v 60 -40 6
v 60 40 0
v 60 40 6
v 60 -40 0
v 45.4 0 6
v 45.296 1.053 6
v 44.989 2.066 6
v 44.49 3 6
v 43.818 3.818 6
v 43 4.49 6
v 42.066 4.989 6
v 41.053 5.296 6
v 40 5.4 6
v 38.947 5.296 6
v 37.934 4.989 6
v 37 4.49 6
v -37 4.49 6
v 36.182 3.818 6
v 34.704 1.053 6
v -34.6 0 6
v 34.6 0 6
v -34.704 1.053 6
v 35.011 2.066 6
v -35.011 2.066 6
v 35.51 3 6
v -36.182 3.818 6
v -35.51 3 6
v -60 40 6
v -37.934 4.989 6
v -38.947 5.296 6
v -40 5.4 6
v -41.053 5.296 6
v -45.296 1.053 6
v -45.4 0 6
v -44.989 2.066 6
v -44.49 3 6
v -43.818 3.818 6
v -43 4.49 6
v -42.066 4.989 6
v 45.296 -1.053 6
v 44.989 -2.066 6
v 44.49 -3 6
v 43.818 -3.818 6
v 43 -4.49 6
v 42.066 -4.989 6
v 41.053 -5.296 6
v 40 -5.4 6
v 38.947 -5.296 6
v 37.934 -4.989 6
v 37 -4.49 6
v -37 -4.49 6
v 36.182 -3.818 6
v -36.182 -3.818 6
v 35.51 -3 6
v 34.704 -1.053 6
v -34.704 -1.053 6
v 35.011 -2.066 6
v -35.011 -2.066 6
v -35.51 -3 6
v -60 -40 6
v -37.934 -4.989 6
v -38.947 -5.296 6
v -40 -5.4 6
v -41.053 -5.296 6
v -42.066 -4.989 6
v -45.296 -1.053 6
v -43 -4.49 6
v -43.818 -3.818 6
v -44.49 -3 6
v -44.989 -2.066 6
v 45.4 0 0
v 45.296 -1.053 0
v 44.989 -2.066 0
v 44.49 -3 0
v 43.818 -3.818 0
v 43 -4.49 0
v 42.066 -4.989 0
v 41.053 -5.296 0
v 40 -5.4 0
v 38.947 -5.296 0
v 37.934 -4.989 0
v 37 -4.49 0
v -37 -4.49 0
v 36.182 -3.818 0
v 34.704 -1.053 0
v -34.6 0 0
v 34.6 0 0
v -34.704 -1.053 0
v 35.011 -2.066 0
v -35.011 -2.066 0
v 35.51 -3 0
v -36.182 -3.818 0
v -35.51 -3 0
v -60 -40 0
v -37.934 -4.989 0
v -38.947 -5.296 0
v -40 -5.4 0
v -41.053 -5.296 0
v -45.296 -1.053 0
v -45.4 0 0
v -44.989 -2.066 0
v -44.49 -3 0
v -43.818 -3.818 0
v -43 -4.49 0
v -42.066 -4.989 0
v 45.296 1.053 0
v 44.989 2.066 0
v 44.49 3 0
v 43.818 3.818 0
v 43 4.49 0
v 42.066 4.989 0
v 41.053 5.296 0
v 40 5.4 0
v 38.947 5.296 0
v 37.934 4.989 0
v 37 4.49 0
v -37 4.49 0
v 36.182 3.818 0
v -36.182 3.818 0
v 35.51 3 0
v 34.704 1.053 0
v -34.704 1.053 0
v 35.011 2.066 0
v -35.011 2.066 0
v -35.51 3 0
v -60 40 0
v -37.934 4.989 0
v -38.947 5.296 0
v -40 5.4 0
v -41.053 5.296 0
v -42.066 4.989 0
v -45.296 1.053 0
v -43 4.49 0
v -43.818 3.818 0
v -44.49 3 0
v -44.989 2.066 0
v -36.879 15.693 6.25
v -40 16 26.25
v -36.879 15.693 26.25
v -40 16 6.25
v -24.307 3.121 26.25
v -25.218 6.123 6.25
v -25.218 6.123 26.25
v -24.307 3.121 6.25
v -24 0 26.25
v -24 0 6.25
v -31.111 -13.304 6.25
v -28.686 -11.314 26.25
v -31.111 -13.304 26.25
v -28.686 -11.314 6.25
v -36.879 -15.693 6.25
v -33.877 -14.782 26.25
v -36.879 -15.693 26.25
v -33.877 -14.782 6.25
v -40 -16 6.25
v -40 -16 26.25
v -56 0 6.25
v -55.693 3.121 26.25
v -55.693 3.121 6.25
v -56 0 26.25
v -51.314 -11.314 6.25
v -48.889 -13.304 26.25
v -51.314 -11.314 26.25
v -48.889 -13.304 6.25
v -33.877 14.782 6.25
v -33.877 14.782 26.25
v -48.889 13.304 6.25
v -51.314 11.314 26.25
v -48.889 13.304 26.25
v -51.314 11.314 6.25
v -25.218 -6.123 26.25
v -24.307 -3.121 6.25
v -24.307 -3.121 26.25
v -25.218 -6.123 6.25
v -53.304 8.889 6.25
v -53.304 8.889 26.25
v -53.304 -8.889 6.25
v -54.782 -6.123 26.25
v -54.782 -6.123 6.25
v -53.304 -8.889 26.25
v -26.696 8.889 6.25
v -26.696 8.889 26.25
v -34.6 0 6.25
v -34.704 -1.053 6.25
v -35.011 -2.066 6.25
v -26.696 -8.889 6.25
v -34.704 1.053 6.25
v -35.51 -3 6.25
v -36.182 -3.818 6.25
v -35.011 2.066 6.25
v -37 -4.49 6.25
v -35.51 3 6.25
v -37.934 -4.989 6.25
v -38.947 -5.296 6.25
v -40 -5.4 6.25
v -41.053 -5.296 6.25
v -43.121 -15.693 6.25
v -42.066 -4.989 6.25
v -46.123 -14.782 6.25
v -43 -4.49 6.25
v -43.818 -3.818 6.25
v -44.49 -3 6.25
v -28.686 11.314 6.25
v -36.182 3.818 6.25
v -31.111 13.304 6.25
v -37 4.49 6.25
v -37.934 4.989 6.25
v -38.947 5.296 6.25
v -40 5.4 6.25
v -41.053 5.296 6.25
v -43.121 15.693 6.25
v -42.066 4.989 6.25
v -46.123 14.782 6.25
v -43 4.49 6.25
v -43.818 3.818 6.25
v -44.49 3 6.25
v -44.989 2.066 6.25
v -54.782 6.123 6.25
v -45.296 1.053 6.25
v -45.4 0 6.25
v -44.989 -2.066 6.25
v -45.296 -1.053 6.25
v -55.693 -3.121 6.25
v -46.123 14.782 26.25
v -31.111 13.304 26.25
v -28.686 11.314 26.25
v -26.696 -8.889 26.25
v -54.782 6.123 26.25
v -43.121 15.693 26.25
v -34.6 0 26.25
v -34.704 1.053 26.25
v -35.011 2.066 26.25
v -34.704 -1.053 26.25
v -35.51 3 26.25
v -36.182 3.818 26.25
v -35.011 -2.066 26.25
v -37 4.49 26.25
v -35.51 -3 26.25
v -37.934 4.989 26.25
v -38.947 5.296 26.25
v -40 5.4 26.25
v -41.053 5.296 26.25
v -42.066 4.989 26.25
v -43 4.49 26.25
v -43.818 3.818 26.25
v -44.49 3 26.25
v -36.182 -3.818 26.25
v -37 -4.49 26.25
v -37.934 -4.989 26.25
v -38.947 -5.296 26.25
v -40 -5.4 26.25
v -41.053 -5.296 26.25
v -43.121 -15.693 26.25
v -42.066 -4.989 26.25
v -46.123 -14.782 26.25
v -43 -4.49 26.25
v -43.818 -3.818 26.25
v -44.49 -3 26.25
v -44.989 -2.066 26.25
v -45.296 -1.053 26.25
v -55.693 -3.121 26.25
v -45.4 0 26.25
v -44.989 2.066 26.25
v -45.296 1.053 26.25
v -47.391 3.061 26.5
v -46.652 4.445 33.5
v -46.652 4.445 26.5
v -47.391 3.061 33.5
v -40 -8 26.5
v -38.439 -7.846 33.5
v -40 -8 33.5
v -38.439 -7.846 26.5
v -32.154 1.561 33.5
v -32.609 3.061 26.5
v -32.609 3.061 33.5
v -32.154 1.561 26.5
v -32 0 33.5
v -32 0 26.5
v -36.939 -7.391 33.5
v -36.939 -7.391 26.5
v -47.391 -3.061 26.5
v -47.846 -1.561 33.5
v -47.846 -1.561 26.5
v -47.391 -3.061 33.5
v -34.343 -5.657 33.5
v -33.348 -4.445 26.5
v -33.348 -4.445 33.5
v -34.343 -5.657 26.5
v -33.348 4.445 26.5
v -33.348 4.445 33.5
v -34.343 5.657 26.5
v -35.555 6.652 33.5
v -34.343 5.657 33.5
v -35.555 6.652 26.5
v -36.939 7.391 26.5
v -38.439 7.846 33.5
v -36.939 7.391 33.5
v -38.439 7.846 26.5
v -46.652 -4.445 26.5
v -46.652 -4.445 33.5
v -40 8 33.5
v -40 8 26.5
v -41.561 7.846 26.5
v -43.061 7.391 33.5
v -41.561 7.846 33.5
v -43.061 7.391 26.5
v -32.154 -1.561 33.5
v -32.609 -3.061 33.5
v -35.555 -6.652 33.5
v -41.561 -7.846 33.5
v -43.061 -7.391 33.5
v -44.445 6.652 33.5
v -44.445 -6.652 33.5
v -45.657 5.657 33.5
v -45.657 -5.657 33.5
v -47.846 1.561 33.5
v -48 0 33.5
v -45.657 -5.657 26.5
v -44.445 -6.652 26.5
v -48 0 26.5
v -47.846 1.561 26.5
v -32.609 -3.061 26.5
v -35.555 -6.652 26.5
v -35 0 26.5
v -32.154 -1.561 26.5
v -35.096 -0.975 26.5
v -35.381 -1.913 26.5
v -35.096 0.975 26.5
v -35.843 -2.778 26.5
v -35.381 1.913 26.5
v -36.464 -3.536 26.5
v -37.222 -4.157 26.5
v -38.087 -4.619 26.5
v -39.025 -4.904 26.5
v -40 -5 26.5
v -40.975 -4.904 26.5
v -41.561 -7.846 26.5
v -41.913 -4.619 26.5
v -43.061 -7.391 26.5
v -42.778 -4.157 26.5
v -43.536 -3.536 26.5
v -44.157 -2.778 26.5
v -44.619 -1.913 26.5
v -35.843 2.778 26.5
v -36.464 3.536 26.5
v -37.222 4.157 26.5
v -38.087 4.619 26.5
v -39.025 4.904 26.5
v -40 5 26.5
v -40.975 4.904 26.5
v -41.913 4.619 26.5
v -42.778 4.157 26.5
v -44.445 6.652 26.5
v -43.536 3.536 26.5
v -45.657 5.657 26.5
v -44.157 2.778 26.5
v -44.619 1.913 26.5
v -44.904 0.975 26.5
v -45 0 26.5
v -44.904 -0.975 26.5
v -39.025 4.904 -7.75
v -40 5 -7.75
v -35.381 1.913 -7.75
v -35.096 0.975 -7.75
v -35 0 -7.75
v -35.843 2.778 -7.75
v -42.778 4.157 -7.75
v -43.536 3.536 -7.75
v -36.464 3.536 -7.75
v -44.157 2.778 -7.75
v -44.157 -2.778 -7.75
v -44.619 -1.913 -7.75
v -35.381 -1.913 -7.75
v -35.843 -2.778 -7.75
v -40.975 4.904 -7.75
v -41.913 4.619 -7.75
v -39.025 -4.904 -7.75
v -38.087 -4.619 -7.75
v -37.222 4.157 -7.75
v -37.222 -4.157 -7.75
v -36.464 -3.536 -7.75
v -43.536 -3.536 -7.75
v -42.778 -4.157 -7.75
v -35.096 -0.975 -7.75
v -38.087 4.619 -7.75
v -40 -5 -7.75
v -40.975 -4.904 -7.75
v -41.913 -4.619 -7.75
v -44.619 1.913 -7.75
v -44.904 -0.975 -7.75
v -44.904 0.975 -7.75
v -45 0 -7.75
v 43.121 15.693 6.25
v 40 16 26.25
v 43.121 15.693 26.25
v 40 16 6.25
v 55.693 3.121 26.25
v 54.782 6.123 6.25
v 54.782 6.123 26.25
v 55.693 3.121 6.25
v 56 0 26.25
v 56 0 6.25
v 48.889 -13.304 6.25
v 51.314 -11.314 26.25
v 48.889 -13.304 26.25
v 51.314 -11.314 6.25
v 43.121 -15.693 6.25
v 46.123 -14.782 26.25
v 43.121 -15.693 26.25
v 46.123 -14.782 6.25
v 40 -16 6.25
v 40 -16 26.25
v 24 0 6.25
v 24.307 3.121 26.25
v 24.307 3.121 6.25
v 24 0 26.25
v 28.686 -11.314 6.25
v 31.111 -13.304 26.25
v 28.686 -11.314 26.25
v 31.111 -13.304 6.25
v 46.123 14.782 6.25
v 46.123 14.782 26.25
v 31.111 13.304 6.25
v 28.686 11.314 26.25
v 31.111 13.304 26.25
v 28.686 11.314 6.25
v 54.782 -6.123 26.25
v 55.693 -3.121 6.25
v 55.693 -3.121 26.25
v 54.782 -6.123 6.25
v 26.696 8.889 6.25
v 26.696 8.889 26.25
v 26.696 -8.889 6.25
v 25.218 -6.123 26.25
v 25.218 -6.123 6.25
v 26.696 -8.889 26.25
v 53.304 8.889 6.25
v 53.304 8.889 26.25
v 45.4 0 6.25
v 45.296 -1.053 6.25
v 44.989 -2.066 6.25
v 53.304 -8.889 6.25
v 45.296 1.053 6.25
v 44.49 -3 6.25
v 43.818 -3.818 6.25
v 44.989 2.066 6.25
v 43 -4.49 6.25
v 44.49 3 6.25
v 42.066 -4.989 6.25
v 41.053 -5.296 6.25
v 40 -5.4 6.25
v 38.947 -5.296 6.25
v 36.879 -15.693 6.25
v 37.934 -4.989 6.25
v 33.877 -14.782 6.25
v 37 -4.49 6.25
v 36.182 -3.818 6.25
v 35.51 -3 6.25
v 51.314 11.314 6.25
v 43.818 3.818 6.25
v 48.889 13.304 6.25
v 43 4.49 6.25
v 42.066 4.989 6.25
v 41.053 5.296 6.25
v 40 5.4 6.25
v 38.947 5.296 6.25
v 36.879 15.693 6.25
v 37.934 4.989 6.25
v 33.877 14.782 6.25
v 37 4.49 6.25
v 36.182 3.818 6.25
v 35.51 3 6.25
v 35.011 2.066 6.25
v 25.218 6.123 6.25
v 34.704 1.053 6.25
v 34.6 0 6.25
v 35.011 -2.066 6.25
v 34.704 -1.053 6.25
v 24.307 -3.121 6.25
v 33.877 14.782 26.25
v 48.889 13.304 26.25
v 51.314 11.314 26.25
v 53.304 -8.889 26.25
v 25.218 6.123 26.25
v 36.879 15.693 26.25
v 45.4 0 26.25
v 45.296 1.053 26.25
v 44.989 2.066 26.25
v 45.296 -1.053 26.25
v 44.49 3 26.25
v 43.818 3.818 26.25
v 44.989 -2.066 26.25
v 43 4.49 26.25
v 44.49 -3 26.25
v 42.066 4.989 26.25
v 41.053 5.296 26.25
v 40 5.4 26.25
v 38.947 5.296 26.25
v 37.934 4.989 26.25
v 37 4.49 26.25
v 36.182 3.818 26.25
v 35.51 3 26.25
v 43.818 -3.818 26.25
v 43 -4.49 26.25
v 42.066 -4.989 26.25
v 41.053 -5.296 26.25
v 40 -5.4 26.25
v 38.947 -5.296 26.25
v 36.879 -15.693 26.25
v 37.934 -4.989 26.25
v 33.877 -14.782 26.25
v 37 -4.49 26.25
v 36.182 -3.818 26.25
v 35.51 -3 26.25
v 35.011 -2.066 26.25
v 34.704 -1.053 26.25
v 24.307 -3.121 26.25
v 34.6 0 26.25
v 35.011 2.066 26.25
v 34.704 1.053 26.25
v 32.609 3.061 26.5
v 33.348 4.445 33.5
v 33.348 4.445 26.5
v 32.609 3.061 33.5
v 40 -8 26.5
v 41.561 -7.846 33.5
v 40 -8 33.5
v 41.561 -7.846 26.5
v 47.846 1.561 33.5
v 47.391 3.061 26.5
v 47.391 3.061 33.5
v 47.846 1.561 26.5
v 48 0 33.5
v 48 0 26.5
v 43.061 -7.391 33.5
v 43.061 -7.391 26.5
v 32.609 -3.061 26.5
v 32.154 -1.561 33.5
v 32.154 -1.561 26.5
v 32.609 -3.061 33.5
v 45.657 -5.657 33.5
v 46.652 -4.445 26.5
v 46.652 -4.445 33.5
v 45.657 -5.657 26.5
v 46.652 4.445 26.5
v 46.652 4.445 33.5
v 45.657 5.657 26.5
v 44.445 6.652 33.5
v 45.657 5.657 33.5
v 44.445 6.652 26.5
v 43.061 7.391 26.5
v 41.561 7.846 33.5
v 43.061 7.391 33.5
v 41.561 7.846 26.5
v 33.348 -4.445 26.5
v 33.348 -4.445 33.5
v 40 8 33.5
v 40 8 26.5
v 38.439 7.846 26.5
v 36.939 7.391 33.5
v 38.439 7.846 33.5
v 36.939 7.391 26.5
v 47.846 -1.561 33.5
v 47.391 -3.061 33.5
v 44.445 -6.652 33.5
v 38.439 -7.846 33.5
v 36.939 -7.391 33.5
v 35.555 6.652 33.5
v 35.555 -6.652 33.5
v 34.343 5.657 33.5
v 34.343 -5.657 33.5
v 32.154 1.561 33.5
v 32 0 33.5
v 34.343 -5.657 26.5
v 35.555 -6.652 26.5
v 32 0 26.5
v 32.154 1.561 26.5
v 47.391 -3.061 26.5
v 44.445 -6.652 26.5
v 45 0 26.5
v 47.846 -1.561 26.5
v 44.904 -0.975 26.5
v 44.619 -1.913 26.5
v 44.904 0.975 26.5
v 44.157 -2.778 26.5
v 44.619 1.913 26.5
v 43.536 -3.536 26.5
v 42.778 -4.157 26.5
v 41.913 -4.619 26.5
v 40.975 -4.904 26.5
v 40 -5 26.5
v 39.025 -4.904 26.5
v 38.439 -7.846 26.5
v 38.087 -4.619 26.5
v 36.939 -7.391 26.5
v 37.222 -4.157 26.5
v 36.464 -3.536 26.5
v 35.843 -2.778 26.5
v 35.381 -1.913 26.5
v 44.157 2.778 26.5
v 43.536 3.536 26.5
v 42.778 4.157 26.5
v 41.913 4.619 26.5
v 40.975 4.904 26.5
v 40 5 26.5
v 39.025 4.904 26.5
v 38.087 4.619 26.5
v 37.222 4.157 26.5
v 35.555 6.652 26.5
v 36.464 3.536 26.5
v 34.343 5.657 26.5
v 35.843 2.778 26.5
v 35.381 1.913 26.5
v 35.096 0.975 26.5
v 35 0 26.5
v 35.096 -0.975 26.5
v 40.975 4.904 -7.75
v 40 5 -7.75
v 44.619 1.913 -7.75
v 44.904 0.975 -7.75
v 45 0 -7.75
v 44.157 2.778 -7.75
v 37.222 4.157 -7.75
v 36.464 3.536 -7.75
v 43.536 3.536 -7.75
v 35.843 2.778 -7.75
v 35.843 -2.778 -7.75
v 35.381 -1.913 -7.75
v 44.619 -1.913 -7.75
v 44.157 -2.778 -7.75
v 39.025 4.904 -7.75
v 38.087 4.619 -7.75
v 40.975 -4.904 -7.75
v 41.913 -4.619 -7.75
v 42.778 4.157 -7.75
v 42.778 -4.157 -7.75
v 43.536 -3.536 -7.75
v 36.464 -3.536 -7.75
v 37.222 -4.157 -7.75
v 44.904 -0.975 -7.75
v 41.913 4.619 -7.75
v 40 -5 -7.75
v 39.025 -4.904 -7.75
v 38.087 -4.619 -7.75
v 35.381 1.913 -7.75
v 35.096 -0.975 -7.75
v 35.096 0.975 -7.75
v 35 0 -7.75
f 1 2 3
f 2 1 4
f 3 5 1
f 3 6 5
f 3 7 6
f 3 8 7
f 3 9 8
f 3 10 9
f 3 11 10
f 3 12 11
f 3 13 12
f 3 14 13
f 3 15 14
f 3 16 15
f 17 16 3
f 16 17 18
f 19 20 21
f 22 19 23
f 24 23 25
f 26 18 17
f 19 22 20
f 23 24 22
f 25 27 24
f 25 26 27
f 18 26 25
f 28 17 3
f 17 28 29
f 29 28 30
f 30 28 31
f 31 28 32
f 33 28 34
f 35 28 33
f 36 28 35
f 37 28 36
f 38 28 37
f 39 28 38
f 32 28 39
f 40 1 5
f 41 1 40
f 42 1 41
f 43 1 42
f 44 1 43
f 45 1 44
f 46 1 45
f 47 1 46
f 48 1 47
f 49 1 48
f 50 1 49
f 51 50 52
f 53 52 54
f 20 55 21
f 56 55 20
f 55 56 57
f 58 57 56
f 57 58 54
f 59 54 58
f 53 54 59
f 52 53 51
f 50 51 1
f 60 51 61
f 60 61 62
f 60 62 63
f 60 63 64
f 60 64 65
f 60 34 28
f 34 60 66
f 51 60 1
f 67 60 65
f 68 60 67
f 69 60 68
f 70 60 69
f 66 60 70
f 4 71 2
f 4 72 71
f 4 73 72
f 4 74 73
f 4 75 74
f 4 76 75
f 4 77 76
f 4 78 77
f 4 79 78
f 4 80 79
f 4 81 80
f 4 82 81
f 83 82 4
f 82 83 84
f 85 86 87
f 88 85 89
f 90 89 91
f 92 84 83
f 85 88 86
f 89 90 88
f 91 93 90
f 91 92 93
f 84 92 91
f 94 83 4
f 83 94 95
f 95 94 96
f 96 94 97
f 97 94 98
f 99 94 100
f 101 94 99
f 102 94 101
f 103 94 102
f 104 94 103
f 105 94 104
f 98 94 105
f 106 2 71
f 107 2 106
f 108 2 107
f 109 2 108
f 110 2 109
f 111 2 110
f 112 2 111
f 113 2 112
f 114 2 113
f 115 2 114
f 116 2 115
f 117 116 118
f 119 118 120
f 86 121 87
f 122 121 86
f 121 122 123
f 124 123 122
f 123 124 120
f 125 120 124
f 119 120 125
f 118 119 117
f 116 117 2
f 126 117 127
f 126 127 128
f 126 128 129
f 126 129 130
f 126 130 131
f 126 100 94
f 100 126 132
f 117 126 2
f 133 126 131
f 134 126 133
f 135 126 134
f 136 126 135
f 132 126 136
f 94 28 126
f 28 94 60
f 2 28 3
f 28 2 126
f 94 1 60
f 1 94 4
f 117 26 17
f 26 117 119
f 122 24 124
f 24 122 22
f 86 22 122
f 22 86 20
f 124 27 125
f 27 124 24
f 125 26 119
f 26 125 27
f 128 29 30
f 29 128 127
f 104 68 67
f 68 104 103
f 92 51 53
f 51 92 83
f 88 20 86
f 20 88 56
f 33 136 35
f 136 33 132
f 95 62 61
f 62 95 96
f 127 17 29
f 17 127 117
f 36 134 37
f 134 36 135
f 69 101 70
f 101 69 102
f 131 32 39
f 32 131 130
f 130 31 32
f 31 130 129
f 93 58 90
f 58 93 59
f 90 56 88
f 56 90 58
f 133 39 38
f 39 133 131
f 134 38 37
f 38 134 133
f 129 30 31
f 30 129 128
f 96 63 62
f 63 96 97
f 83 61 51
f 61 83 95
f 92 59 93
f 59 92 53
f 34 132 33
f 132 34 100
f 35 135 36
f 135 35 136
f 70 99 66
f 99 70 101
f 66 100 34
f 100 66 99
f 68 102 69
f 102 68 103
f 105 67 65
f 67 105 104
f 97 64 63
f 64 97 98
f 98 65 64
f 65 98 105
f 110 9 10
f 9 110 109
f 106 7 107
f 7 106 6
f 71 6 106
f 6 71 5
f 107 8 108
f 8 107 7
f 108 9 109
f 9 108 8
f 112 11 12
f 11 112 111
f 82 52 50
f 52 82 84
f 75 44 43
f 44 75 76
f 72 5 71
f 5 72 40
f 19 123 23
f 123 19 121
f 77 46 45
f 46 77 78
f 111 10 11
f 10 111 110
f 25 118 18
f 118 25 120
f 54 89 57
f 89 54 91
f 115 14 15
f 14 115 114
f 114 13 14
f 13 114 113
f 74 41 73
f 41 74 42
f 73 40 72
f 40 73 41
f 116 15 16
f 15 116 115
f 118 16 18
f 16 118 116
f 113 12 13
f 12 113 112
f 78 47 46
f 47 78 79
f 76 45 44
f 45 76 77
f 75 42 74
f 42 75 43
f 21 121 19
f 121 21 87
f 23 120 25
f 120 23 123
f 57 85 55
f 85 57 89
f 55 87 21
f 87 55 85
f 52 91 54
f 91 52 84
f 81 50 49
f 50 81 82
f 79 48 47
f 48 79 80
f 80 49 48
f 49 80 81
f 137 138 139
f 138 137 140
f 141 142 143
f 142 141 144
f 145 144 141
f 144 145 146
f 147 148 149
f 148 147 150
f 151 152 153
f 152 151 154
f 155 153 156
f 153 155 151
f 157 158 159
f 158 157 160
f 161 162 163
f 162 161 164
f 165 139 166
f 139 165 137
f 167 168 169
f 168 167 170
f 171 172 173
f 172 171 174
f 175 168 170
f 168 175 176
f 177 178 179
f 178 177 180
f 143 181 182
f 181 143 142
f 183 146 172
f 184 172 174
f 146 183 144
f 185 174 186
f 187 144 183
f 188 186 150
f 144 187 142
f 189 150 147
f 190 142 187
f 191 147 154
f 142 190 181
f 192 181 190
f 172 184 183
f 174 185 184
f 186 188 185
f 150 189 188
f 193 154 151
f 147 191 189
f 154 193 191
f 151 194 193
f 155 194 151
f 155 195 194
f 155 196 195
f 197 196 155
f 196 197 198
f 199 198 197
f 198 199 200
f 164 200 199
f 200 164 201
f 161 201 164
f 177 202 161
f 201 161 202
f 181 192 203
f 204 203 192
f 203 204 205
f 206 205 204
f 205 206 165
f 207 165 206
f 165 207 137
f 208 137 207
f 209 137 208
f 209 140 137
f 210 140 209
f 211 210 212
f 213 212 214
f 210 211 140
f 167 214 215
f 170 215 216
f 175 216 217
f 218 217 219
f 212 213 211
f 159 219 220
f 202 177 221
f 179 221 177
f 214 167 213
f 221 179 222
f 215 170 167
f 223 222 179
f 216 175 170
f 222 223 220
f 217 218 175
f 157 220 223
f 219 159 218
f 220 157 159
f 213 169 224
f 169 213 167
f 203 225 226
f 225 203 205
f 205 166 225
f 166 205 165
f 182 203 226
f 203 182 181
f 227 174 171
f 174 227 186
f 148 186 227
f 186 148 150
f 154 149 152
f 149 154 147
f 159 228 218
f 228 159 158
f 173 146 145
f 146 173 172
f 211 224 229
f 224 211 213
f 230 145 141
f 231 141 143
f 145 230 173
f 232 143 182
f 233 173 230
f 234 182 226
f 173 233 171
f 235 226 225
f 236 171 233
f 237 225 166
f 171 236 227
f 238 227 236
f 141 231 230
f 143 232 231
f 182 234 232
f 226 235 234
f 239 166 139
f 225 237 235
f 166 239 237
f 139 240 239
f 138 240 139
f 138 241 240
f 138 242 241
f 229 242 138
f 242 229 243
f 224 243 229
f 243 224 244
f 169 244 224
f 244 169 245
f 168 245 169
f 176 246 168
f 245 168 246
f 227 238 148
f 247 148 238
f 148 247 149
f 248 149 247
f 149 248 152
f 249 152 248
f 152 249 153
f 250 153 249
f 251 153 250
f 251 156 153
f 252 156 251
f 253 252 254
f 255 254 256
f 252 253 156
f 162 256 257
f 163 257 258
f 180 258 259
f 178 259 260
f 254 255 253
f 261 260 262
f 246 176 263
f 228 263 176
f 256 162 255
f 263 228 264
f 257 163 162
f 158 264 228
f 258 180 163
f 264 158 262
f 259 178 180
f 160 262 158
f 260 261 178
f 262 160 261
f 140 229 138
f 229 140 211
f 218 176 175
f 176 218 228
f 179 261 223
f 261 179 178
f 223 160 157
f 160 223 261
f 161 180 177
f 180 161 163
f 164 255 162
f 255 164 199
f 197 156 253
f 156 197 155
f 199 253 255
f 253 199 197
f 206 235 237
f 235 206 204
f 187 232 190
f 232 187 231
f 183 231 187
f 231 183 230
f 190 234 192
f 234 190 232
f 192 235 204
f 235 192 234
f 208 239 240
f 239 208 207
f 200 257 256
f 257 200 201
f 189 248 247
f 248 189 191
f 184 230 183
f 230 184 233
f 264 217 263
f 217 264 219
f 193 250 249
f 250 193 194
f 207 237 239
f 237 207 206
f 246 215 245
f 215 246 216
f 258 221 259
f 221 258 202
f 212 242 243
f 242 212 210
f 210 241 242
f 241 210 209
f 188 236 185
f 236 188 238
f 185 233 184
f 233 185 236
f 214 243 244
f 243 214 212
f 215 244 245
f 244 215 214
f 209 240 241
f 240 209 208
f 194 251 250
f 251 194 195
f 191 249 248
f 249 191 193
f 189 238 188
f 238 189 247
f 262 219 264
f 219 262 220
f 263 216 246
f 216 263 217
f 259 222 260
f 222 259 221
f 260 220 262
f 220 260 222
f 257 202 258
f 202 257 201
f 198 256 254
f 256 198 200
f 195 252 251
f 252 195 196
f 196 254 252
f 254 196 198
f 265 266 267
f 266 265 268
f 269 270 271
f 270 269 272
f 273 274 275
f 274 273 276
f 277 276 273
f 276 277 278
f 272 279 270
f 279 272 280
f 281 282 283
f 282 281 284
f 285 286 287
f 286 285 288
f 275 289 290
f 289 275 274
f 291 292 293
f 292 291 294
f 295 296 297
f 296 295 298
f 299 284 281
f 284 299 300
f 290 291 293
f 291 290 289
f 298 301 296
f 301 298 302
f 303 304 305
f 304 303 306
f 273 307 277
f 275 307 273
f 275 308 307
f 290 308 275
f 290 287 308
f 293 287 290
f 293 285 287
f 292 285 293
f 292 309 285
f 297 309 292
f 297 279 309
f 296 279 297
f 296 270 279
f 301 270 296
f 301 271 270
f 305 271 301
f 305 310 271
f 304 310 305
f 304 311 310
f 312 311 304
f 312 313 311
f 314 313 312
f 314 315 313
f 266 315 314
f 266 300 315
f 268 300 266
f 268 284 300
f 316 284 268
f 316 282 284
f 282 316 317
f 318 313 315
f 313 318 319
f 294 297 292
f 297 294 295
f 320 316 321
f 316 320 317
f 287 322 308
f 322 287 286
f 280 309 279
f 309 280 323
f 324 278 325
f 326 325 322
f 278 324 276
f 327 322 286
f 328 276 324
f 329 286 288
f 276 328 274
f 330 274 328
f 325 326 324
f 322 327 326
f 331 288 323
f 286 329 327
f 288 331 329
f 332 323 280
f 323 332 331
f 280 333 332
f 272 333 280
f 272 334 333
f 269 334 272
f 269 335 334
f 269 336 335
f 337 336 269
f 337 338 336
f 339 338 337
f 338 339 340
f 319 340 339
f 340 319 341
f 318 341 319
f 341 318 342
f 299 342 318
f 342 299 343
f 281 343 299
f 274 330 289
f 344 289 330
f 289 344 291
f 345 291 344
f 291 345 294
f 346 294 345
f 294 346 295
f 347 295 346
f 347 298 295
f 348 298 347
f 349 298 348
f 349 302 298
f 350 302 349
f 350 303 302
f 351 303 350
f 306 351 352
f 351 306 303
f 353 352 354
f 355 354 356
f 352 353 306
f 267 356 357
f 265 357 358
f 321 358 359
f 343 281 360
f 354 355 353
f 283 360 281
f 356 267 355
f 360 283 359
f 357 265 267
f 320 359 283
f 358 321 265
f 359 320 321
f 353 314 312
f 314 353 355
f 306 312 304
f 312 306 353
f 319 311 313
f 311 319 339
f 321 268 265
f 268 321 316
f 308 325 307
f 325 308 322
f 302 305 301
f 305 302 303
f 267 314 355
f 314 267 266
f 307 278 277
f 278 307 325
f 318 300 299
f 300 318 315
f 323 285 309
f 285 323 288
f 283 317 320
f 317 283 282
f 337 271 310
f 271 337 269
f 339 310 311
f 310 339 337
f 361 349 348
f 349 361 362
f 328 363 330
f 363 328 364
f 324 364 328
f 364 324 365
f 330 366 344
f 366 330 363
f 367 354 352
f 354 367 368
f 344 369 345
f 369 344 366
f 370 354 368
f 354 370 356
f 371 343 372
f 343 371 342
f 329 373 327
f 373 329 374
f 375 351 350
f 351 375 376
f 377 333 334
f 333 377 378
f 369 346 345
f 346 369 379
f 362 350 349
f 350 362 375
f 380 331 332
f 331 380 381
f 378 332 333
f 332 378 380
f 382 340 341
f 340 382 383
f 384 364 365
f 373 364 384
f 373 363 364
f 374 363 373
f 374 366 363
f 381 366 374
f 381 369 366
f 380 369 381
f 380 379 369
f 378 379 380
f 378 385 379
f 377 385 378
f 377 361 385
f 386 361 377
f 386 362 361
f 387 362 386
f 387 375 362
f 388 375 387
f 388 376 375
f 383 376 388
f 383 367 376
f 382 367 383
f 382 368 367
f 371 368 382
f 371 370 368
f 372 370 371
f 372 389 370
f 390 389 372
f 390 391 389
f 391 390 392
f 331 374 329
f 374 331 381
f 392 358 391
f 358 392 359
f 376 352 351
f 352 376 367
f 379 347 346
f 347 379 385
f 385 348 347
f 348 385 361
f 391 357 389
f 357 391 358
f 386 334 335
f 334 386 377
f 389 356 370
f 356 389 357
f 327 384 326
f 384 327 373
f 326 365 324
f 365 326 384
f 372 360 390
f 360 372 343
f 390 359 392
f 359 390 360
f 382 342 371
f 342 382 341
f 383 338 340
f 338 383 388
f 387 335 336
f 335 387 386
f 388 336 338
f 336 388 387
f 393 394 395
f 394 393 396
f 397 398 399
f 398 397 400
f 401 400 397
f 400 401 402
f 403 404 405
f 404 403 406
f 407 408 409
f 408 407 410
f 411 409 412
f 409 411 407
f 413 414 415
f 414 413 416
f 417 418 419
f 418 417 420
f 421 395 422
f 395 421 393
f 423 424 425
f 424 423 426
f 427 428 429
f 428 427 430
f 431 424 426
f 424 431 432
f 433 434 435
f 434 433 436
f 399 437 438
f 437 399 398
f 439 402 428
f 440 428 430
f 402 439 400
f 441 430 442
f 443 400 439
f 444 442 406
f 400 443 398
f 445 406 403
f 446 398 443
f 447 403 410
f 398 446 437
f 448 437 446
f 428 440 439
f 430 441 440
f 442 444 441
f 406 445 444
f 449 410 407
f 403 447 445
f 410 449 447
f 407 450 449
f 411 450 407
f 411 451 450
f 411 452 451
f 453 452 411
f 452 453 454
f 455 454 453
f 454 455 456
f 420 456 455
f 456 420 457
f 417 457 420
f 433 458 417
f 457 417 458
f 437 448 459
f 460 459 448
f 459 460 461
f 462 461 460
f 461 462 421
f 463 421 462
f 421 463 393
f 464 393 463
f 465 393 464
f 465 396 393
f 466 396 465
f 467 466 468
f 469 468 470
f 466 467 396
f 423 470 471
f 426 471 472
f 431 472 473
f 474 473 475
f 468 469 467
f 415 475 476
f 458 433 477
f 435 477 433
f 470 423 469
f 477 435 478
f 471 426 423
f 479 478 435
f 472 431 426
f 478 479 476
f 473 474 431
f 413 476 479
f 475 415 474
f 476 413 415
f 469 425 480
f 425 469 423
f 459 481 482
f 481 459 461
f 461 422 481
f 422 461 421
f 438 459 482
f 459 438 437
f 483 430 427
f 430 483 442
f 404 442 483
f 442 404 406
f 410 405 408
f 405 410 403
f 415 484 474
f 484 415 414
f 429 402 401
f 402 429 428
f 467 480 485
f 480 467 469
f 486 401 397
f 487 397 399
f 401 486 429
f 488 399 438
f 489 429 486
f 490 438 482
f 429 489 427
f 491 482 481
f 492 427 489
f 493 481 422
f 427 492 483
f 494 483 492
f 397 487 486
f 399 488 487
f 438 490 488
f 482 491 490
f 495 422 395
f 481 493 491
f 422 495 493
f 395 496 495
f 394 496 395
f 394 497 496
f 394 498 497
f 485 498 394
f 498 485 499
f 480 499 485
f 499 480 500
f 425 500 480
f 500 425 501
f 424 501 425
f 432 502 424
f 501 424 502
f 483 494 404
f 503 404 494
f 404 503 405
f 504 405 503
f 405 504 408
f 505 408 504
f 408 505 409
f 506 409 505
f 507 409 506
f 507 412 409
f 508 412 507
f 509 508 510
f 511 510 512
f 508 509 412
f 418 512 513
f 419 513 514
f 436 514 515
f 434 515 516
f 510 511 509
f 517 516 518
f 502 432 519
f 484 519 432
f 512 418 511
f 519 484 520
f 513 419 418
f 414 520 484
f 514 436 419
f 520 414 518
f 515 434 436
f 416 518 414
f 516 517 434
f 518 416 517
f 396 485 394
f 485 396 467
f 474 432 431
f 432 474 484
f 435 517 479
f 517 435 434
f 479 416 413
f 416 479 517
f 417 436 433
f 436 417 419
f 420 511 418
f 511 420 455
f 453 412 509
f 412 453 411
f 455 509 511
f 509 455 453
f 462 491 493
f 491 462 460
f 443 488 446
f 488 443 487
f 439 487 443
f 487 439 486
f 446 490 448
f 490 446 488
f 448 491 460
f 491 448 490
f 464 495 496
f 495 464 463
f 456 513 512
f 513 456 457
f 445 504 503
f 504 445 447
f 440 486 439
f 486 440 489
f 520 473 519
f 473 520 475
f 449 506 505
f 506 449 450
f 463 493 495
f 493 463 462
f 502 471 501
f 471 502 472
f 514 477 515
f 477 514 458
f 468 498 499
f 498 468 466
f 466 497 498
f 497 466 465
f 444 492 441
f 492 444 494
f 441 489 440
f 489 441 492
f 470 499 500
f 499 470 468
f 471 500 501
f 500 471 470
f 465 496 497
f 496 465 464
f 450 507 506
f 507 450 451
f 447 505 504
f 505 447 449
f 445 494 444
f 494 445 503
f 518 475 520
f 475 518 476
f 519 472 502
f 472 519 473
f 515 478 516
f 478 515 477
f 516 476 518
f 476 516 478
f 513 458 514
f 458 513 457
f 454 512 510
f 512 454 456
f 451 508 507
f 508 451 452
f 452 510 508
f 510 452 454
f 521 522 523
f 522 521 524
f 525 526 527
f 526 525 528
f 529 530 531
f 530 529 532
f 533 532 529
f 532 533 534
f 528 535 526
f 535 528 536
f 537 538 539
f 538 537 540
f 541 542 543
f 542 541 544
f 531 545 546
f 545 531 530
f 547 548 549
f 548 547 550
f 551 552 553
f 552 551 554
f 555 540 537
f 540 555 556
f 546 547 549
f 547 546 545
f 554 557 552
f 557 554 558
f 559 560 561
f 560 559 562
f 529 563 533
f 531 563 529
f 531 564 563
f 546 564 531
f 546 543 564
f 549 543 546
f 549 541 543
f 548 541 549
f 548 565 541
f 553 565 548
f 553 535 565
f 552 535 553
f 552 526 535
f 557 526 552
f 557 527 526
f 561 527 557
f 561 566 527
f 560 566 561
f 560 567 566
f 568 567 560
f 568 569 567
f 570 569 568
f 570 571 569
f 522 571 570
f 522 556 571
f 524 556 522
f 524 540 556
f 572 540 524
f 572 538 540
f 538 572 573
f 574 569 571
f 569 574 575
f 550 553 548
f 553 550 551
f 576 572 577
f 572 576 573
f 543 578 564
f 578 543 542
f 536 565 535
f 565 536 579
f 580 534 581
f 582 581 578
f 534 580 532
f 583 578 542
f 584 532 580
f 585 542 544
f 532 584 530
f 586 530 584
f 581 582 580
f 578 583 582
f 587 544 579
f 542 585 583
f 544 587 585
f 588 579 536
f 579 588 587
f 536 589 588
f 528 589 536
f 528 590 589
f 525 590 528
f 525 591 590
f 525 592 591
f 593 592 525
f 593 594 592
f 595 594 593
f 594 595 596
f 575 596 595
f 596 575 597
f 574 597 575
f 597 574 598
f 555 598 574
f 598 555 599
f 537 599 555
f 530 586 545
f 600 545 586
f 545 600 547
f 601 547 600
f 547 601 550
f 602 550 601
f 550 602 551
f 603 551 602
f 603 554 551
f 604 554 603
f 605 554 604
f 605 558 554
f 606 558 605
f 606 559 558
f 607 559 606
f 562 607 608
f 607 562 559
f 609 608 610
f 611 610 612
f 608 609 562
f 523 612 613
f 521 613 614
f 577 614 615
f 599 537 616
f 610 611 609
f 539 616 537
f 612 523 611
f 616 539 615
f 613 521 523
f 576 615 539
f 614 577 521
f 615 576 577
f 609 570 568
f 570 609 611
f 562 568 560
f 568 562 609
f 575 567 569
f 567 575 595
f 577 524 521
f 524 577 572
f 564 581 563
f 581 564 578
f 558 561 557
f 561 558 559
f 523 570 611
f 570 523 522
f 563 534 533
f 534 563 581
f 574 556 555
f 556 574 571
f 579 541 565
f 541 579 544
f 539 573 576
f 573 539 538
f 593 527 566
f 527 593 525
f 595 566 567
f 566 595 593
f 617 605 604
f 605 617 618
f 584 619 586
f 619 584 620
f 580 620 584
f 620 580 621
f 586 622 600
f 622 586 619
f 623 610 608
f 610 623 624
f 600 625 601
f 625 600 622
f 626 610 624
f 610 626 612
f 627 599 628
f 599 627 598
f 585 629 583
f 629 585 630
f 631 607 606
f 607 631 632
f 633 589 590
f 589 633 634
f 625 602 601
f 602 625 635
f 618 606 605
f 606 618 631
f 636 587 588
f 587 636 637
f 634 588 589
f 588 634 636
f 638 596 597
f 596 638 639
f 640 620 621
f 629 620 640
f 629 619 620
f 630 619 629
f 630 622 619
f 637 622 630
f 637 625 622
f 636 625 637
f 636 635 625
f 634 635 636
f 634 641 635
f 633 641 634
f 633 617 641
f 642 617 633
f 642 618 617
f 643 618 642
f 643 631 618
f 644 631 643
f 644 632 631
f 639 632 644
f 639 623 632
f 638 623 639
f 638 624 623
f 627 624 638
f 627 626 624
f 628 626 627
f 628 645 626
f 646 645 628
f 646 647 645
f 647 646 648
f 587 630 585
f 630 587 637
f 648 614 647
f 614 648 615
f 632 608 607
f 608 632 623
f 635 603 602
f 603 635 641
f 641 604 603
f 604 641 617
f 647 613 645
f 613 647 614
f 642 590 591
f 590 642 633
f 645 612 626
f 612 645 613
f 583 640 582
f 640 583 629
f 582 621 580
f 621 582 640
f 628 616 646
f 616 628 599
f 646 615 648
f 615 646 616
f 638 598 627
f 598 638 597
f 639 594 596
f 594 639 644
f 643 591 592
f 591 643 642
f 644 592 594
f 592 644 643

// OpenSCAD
$fn = 32;

// ------------------------------------------------------------------------
// Standoff columns: 2 d32 standoffs, bolts d10
// Every part is its own module, assembly() places them once.
// ------------------------------------------------------------------------

// --- part 1 ---
module base_plate() {
  difference() {
    translate([-60, -40, 0]) cube([120, 80, 6]);
    translate([-40, 0, -1]) cylinder(h = 8, d = 10.8);
    translate([40, 0, -1]) cylinder(h = 8, d = 10.8);
  }
}

// --- part 2 ---
module spacer1() {
  difference() {
      translate([0, 0, 0]) cylinder(h = 20, d = 32);
      translate([0, 0, -1]) cylinder(h = 22, d = 10.8);
    }
}

// --- part 3 ---
module bolt1() {
  cylinder(h = 7, d = 16);
  translate([0, 0, -34.25]) cylinder(h = 34.25, d = 10);
}

// --- part 4 ---
module spacer2() {
  difference() {
      translate([0, 0, 0]) cylinder(h = 20, d = 32);
      translate([0, 0, -1]) cylinder(h = 22, d = 10.8);
    }
}

// --- part 5 ---
module bolt2() {
  cylinder(h = 7, d = 16);
  translate([0, 0, -34.25]) cylinder(h = 34.25, d = 10);
}

// --- assembly ---
module assembly() {
  translate([0, 0, 0]) rotate([0, 0, 0]) base_plate();
  translate([-40, 0, 6.25]) rotate([0, 0, 0]) spacer1();
  translate([-40, 0, 26.5]) rotate([0, 0, 0]) bolt1();
  translate([40, 0, 6.25]) rotate([0, 0, 0]) spacer2();
  translate([40, 0, 26.5]) rotate([0, 0, 0]) bolt2();
}

assembly();
